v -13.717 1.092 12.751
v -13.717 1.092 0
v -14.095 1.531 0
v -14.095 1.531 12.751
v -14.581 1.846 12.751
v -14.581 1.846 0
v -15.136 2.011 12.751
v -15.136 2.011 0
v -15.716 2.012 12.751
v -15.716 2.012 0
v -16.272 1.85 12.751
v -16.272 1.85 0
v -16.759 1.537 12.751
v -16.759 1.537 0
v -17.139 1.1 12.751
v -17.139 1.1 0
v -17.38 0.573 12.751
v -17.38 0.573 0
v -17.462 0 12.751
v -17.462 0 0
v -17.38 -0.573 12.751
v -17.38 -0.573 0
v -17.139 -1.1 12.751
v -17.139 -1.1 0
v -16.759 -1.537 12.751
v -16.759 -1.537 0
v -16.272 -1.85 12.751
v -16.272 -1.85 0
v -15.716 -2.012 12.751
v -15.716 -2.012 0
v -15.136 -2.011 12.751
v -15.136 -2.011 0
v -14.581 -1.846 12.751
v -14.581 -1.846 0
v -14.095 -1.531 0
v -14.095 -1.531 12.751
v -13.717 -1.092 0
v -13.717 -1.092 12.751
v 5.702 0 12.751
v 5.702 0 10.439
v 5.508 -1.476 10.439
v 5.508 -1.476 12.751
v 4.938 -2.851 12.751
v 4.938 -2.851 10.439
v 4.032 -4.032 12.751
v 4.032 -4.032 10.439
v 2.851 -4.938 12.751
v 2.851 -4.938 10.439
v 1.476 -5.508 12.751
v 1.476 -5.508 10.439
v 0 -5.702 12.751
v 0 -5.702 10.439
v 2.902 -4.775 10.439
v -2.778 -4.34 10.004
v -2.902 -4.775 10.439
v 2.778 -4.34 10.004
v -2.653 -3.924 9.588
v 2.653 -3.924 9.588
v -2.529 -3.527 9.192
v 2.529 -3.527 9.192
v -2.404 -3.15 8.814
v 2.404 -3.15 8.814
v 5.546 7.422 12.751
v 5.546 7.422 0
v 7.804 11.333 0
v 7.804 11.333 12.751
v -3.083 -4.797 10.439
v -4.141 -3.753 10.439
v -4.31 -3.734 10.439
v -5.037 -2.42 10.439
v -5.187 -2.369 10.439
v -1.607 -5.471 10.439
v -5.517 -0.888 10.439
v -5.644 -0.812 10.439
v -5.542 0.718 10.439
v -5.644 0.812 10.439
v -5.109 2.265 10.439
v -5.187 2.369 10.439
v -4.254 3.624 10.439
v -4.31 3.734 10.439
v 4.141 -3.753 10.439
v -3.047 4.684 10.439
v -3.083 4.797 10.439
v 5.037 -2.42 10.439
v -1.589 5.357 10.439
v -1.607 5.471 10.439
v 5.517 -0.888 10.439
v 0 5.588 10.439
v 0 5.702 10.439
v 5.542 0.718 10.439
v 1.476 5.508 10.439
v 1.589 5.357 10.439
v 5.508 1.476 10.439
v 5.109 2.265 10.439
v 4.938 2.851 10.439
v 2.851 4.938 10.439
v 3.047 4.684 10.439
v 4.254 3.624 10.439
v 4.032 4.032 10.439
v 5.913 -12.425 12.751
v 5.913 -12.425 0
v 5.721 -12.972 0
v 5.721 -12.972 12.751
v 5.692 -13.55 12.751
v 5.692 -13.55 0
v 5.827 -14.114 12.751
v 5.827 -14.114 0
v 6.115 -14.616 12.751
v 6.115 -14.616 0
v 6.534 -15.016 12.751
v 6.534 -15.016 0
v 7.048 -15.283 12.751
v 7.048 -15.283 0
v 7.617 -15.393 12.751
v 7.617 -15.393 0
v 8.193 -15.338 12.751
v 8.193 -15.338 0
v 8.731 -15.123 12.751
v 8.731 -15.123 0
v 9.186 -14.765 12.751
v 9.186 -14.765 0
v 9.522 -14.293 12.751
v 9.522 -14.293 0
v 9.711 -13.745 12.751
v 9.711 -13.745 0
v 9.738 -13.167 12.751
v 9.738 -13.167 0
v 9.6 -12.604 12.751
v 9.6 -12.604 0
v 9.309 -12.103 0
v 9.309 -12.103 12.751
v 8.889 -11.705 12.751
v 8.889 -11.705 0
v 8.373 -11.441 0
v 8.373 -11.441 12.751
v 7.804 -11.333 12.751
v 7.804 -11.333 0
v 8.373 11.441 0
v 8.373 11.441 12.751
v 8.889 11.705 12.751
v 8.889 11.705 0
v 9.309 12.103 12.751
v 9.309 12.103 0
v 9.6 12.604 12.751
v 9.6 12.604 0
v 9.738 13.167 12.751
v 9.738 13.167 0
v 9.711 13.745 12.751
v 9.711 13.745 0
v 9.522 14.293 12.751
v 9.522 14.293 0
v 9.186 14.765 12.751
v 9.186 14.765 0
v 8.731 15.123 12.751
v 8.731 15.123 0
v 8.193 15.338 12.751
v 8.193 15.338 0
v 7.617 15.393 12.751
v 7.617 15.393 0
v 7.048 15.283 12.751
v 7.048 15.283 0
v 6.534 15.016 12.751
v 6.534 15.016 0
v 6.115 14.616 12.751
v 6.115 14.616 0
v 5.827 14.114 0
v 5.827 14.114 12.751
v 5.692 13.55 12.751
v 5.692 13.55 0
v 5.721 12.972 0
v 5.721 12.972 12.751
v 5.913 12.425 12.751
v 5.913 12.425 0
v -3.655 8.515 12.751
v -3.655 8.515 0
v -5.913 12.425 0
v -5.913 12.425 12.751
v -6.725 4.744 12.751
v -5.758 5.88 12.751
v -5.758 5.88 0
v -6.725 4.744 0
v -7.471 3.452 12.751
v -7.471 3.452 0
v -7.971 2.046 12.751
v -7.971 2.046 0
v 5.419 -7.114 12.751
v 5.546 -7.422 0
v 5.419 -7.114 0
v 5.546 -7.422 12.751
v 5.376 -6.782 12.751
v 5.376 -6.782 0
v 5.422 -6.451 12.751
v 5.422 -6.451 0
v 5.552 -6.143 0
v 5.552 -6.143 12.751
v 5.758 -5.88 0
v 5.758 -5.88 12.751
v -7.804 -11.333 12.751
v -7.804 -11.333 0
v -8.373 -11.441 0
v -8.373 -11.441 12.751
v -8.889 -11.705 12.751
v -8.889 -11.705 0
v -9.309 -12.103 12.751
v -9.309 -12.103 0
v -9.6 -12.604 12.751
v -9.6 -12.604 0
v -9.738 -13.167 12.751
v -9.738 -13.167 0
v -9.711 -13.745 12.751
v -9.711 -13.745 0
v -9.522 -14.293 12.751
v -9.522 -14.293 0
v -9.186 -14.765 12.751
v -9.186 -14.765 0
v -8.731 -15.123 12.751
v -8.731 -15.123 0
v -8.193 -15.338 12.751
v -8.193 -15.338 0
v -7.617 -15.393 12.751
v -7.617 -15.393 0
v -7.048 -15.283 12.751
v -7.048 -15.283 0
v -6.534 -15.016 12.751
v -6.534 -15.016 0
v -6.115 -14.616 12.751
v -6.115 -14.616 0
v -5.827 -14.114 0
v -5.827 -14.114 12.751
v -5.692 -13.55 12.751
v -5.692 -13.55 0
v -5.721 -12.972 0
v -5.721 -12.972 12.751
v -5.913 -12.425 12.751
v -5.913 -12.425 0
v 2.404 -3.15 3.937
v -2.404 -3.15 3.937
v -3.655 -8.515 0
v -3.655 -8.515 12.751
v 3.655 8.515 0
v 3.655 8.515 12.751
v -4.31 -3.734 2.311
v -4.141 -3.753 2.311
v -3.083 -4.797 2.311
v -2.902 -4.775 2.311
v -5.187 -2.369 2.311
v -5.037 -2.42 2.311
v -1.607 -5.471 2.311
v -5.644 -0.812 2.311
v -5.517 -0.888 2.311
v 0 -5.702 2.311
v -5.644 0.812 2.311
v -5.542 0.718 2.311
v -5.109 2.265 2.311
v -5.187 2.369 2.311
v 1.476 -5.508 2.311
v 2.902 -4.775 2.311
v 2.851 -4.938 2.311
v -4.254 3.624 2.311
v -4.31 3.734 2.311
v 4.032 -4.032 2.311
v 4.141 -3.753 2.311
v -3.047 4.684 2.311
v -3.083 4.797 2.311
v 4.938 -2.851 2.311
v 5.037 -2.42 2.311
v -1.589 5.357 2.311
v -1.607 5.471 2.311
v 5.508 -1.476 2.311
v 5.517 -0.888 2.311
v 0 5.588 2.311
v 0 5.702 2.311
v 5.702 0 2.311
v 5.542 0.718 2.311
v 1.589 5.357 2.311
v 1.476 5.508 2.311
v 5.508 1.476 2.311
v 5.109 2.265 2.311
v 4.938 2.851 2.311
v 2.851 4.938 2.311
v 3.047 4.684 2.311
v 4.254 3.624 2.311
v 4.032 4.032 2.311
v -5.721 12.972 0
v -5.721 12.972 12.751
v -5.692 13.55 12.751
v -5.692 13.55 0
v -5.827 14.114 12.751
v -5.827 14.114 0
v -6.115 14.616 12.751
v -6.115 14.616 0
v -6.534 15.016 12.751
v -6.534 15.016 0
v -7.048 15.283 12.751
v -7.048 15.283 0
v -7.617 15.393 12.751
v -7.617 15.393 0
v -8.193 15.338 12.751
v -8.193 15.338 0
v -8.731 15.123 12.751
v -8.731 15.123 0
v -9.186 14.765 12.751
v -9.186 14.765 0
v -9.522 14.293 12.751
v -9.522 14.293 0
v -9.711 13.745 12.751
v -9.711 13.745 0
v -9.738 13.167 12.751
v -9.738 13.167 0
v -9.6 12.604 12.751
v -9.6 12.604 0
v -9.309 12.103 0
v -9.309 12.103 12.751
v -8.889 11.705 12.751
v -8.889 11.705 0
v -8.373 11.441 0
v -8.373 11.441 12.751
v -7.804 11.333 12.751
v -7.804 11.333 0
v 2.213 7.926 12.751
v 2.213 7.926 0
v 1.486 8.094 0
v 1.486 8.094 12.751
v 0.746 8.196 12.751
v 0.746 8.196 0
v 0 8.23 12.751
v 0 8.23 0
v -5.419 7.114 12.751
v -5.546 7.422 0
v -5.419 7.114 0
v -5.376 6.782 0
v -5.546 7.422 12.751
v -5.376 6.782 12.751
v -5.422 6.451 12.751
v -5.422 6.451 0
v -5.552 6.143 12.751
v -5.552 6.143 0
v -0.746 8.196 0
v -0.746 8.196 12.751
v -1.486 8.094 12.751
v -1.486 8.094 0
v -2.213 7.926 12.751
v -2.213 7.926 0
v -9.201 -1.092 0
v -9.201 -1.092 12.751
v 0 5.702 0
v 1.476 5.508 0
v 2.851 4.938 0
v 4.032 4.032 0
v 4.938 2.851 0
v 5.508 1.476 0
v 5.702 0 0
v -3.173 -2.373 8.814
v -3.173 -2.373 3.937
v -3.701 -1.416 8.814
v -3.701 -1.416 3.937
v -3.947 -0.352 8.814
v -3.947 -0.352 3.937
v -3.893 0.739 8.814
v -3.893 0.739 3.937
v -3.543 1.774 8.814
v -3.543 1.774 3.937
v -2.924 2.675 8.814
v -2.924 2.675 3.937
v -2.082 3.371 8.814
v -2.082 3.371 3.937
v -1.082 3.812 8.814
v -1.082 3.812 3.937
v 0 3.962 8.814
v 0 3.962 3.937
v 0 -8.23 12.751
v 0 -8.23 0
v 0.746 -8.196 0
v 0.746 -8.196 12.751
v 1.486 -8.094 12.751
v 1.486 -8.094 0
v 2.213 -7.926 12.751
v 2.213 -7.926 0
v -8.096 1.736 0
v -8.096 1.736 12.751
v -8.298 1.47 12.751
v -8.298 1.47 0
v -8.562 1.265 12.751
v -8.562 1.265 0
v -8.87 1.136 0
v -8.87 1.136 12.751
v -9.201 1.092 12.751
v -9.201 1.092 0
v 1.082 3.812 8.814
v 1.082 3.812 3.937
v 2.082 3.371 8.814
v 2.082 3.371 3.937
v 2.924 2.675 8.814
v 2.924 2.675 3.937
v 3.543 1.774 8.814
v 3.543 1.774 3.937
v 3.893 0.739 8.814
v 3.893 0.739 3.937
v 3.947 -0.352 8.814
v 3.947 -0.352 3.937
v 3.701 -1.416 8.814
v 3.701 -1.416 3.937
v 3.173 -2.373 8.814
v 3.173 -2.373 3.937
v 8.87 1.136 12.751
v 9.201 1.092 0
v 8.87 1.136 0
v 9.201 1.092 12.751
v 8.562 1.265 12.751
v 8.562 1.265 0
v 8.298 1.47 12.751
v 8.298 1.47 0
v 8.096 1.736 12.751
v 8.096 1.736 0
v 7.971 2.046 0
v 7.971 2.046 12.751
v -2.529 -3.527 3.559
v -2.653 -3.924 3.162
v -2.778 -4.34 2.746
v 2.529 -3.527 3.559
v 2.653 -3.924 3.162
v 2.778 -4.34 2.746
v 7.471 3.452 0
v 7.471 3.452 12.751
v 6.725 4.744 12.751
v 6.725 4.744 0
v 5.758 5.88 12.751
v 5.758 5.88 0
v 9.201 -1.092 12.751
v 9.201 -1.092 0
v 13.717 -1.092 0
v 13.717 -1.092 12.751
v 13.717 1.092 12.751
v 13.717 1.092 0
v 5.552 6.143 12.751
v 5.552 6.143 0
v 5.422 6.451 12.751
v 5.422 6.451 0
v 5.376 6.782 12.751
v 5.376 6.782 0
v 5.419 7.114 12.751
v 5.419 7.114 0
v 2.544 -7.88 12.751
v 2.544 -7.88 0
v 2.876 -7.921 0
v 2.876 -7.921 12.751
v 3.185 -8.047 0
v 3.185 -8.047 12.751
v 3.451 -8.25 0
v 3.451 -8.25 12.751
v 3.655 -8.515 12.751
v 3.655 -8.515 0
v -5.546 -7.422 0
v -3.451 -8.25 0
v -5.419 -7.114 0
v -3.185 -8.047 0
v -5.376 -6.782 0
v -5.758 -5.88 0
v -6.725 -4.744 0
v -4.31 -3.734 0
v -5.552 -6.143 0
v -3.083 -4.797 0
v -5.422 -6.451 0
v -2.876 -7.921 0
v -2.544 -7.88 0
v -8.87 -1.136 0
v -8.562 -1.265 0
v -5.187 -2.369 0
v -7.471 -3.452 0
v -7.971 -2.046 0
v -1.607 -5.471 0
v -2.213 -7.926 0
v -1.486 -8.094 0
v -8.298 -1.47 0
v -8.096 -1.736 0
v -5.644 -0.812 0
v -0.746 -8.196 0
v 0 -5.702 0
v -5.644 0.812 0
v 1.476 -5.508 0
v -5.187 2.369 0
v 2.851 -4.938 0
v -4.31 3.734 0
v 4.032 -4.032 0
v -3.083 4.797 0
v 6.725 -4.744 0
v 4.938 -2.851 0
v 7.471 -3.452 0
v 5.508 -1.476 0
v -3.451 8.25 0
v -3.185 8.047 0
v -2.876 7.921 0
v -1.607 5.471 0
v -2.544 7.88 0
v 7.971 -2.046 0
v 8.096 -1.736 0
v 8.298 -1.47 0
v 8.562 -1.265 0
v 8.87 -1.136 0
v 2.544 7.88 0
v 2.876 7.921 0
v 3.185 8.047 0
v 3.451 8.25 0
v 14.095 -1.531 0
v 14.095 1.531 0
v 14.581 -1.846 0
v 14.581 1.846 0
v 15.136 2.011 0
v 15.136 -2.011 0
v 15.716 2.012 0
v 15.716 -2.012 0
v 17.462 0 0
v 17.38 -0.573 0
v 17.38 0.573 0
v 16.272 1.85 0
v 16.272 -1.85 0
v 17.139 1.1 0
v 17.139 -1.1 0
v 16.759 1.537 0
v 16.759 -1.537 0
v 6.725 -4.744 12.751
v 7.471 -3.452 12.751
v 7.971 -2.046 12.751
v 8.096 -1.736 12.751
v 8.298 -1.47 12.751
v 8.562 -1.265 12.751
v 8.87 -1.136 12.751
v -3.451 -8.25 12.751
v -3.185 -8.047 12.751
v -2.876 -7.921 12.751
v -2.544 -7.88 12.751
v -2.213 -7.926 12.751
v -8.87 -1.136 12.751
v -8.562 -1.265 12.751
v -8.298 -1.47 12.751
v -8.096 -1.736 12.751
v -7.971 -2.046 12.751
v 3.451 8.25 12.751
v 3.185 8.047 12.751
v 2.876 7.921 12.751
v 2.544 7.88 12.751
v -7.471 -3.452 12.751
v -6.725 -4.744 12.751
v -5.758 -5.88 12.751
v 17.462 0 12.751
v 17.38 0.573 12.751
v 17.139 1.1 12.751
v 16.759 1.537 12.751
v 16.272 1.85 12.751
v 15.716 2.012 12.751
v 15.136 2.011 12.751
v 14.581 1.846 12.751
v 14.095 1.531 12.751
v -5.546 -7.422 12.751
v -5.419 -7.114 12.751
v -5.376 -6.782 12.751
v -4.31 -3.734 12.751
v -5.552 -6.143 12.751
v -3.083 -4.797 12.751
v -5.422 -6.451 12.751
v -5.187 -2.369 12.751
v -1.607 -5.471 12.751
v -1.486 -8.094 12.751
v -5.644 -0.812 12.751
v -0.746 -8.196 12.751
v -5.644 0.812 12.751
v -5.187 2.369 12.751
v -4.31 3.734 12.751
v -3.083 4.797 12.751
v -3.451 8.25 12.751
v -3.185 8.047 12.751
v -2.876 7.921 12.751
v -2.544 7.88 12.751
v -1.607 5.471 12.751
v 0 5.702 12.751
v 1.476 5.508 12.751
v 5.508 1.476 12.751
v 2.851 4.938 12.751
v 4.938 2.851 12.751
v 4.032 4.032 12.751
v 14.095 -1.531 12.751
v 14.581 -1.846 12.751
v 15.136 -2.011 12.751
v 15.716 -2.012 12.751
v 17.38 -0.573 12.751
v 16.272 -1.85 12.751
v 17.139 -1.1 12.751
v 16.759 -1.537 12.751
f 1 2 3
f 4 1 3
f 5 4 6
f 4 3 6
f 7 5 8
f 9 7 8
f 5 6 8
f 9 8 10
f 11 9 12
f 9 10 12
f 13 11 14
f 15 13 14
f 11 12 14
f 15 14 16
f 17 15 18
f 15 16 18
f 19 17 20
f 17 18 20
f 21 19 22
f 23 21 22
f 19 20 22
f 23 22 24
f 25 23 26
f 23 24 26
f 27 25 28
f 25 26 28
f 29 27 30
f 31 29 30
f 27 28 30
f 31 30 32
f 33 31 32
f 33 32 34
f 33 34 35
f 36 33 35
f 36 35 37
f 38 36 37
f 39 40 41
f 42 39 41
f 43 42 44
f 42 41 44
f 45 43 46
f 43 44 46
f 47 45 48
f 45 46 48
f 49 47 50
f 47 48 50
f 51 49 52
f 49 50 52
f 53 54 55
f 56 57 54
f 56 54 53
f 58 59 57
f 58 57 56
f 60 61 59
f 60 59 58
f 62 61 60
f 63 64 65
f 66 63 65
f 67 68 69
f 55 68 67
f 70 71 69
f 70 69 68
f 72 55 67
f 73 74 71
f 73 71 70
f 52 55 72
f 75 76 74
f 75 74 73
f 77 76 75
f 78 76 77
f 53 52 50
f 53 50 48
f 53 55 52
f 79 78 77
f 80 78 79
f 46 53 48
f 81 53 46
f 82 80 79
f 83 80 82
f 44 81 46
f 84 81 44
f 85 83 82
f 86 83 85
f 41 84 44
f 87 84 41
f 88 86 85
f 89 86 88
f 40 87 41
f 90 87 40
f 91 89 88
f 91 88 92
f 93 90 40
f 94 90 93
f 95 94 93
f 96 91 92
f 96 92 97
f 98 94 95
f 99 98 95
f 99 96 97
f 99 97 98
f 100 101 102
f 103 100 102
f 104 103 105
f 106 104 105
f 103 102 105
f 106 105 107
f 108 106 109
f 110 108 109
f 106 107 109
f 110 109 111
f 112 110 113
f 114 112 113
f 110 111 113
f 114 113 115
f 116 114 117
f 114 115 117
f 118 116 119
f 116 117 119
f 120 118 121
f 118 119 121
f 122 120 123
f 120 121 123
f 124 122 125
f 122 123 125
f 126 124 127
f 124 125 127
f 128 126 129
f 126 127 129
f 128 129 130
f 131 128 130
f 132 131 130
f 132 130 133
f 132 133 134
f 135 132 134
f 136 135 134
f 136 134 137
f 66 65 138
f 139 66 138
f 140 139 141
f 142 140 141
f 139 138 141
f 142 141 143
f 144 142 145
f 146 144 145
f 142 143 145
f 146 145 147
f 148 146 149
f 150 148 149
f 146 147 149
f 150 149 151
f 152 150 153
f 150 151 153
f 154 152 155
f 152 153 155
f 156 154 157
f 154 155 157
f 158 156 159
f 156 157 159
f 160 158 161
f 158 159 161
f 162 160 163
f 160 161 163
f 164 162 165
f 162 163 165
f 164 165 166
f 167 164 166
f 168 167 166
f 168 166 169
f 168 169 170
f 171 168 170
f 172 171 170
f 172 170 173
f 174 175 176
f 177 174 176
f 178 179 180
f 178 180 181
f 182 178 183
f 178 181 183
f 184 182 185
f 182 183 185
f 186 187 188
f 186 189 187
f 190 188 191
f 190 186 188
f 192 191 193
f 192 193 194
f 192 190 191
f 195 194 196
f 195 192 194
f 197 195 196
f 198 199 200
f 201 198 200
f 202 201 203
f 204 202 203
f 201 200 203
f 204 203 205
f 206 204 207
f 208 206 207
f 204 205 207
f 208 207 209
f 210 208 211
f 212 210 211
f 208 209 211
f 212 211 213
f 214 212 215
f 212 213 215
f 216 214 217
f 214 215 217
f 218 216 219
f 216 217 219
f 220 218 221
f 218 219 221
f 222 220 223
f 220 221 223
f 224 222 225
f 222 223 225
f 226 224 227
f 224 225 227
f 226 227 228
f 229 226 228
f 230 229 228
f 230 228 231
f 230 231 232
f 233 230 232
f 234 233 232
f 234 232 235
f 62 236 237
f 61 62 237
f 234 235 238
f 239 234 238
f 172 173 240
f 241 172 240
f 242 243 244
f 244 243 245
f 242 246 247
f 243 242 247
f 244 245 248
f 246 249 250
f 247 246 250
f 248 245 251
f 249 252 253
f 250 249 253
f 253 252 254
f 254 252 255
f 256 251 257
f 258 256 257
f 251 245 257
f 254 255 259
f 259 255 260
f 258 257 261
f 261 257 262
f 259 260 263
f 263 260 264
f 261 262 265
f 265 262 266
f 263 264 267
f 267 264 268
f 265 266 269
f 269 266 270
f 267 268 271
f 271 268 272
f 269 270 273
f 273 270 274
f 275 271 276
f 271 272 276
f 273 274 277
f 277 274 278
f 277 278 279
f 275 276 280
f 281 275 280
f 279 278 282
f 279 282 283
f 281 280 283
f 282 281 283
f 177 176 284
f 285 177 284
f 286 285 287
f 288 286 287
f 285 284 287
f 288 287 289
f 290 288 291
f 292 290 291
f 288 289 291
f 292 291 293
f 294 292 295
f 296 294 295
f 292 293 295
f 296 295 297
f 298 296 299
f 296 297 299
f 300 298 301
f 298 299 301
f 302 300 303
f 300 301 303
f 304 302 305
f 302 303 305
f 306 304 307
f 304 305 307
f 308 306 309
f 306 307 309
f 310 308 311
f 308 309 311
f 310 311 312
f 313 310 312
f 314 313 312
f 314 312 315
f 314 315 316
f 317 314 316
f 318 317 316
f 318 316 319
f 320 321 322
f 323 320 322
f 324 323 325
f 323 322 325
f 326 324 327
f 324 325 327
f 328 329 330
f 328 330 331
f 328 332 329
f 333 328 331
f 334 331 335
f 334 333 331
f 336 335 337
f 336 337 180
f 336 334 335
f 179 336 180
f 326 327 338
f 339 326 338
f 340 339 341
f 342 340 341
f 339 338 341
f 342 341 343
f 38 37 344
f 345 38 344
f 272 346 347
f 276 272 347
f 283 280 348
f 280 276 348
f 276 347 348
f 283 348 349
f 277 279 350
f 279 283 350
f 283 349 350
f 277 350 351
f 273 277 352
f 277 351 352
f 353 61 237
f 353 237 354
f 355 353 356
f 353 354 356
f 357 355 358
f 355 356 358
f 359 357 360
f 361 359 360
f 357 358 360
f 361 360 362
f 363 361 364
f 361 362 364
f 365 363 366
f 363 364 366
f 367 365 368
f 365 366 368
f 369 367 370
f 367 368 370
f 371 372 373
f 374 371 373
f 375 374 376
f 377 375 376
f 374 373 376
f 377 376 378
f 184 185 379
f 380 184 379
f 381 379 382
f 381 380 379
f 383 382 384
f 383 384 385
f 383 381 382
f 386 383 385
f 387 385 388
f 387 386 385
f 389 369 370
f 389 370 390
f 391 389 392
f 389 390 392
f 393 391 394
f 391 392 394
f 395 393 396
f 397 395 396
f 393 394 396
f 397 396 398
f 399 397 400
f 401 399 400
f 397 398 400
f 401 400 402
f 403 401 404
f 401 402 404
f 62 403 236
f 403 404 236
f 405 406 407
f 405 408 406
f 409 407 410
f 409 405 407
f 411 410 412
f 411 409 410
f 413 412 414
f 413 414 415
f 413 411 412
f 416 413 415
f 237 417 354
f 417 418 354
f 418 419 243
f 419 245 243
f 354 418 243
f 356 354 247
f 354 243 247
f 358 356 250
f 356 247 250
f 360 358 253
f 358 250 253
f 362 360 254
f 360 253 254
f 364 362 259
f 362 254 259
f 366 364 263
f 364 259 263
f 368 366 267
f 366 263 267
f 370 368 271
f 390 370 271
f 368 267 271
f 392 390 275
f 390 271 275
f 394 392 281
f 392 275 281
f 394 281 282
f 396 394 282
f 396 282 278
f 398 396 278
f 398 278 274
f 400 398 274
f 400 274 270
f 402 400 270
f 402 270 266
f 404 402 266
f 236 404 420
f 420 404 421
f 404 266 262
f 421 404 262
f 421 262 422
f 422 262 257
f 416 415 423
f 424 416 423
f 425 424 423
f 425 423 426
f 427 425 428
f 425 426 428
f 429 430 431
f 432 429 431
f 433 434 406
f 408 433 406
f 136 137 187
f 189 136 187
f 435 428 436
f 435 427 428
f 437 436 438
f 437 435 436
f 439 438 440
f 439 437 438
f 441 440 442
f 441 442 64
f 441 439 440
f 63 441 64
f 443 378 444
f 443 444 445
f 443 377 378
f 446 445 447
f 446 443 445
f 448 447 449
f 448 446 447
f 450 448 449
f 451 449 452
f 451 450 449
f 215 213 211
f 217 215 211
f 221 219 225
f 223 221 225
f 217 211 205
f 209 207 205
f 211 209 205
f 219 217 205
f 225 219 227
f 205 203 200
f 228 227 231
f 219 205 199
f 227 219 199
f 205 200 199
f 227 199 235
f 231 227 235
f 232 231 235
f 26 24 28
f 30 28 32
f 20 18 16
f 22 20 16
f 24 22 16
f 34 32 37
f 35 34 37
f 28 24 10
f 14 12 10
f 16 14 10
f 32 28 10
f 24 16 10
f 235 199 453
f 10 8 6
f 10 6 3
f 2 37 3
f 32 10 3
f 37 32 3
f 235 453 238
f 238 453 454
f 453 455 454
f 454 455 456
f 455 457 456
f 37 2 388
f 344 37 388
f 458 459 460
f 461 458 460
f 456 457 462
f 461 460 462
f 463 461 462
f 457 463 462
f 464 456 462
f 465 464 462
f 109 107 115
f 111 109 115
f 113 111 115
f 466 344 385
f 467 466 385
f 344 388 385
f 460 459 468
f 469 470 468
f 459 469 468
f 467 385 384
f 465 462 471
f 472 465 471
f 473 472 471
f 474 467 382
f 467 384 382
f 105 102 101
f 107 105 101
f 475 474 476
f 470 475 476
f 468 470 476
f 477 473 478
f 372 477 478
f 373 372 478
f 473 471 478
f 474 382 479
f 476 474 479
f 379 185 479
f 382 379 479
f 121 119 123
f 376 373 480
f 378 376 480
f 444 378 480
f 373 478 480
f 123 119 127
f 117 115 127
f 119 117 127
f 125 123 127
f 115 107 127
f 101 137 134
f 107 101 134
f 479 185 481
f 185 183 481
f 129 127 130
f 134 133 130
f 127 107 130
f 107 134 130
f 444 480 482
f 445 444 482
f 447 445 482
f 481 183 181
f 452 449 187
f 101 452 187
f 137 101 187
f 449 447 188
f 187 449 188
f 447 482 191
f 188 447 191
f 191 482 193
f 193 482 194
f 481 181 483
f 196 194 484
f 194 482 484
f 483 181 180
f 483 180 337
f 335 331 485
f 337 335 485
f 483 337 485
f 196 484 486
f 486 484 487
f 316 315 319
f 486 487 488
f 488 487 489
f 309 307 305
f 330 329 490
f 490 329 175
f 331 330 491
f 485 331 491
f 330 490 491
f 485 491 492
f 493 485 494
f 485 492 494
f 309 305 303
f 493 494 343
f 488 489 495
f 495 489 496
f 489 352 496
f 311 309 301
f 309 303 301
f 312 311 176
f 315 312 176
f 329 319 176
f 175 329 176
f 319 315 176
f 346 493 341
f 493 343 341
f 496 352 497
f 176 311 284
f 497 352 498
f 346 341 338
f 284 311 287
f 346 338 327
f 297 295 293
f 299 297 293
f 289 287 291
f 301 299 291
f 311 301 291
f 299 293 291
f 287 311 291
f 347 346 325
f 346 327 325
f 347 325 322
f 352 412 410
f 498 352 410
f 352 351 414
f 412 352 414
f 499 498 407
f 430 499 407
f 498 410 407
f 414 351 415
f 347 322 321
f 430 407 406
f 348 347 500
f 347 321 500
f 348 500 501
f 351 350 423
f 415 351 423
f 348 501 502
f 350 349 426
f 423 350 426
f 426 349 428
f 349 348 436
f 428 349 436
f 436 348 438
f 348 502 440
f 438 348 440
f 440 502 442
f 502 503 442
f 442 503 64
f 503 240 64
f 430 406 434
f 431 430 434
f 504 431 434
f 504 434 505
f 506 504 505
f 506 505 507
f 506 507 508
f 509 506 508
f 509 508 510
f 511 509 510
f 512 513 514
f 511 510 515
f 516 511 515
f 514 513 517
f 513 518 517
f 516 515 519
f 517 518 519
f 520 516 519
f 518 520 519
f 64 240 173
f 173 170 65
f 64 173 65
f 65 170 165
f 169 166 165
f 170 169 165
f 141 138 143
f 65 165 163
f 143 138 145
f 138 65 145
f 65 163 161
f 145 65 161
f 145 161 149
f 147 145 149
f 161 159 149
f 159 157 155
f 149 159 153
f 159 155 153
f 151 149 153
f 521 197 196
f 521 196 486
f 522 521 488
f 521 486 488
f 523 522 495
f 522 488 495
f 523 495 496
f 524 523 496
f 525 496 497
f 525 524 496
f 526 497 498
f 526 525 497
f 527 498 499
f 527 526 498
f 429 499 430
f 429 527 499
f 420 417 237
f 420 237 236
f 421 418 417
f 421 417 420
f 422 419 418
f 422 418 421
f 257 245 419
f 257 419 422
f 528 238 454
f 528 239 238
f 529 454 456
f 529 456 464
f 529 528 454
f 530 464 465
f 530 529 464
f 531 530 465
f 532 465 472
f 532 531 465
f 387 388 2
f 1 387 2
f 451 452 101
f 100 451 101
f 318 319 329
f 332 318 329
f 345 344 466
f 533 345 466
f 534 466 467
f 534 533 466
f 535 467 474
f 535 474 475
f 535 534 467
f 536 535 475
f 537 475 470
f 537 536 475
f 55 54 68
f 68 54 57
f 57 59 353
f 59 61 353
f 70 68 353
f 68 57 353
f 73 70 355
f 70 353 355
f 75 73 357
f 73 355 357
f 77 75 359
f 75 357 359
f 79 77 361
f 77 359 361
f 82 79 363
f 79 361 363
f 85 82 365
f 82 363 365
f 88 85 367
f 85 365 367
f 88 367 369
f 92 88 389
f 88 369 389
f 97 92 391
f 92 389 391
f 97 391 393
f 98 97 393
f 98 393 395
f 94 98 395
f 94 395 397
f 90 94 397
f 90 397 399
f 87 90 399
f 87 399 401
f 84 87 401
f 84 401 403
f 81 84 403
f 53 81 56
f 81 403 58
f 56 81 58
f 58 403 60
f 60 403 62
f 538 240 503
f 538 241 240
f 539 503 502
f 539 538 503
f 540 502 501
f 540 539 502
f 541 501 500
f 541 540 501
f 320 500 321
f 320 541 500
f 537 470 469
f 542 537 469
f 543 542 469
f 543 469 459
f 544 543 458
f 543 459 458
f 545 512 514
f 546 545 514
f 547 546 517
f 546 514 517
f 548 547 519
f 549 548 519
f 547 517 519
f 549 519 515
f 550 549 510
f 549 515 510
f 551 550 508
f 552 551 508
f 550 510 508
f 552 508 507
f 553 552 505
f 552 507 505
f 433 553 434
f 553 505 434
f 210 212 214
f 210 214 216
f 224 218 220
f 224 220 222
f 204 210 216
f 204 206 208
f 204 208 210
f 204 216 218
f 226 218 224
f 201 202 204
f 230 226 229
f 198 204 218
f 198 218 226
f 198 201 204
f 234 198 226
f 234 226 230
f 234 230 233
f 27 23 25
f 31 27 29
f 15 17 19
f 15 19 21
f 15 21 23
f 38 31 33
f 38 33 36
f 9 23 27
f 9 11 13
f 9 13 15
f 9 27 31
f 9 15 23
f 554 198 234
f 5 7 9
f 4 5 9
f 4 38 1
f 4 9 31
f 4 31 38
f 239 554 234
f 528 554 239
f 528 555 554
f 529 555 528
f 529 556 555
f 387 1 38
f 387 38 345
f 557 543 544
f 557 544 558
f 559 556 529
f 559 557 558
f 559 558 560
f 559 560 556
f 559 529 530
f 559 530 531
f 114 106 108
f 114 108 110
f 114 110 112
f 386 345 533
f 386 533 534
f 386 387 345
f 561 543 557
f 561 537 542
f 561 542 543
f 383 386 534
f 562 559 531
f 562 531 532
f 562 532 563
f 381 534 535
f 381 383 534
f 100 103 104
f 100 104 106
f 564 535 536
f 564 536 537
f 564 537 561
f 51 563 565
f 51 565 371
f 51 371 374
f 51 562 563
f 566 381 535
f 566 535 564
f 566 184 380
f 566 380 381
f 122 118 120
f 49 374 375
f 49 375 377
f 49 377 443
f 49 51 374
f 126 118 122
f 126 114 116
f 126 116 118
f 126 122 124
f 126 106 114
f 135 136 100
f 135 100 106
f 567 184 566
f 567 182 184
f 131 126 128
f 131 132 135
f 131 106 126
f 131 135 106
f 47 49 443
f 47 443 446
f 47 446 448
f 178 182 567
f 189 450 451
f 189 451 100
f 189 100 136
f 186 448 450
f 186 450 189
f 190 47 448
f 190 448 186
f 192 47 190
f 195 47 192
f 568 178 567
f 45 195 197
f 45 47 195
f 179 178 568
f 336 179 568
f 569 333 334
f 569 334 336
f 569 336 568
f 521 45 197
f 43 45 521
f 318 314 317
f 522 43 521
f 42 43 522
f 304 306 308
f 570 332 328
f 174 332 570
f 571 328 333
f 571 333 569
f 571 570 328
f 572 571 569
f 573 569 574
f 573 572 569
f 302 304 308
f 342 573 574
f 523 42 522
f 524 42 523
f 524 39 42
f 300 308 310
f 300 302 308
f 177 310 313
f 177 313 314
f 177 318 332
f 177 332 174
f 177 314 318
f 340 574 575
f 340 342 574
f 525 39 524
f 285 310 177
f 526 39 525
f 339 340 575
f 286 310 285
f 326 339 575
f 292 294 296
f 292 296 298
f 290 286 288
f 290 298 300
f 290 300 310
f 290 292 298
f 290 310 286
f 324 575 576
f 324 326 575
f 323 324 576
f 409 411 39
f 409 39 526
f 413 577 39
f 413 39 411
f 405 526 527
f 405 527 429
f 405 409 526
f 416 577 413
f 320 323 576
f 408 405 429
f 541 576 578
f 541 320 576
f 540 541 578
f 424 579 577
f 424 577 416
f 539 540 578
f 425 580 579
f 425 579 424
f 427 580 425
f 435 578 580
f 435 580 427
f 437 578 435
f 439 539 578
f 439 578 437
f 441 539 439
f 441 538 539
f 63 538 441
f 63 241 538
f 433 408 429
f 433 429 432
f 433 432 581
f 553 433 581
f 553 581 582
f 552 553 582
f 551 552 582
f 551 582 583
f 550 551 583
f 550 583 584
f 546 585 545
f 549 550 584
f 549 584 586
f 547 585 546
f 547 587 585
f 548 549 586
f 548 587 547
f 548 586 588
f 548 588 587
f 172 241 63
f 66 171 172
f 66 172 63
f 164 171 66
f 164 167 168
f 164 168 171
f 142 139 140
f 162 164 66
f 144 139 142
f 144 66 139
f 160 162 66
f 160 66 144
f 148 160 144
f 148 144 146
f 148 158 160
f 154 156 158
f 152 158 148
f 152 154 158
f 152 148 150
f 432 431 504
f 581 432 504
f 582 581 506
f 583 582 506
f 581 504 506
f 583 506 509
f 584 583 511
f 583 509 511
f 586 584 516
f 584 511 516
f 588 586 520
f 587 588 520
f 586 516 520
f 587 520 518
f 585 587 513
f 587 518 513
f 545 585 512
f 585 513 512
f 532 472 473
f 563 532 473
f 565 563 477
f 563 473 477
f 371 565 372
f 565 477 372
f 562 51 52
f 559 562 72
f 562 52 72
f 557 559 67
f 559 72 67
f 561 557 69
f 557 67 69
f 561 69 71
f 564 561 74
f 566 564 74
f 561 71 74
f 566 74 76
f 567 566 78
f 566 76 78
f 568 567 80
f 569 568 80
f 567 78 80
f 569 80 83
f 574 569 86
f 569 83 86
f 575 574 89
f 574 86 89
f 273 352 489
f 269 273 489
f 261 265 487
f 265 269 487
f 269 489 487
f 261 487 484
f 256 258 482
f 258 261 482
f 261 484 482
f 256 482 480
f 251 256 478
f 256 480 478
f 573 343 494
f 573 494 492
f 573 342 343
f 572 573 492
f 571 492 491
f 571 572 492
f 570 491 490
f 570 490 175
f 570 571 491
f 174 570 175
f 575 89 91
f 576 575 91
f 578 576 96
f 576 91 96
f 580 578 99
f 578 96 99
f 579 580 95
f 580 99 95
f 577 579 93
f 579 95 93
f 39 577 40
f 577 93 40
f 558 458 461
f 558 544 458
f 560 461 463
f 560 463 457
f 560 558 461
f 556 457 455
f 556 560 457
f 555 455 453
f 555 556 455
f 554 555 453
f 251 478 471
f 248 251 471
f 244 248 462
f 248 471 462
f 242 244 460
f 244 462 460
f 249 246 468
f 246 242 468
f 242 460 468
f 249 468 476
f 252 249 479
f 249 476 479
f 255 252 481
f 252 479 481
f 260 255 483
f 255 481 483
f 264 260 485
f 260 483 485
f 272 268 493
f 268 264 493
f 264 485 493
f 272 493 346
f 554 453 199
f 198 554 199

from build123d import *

# Parameters (mm, degrees)
F1_DEPTH     = 12.7508
F2_START     = 2.3114
F2_DEPTH     = 8.128
F3_R         = 1.27
F4_T4_DEPTH  = 13.1696453782
F4_S5_R      = 3.9624
F4_T6_DEPTH  = 8
F4_T15_DEPTH = 13.1696453782
F4_S16_R     = 3.9624
F4_T17_DEPTH = 8


# Not quite as in the source:
# - a fillet or chamfer that OpenCascade refuses, or shapes differently, is made with other operations: its cross-section is extruded or revolved along the edge and cut away or added
# - a feature names something its author has since deleted; it is built from what else it names


with BuildPart() as f1:
    # F0 (on Top) → F1 (new body)
    with BuildSketch(Plane.XY):
        with BuildLine():
            ThreePointArc((0, -5.7023), (-5.7023, 0), (0, 5.7023))
            Line((0, 5.7023), (0, 8.2296))
            ThreePointArc((0, 8.2296), (-1.596599089, 8.0732389726), (-3.1325279453, 7.6100975573))
            Line((-3.1325279453, 7.6100975573), (-5.9126210852, 12.4253601255))
            ThreePointArc((-5.9126210852, 12.4253601255), (-8.73125, 15.1229686136), (-7.8043669773, 11.3331601255))
            Line((-7.8043669773, 11.3331601255), (-5.0242738373, 6.5178975573))
            ThreePointArc((-5.0242738373, 6.5178975573), (-7.127042663, 4.1148), (-8.1568017826, 1.0922))
            Line((-8.1568017826, 1.0922), (-13.7169880625, 1.0922))
            ThreePointArc((-13.7169880625, 1.0922), (-17.4625, 0), (-13.7169880625, -1.0922))
            Line((-13.7169880625, -1.0922), (-8.1568017826, -1.0922))
            ThreePointArc((-8.1568017826, -1.0922), (-7.127042663, -4.1148), (-5.0242738373, -6.5178975573))
            Line((-5.0242738373, -6.5178975573), (-7.8043669773, -11.3331601255))
            ThreePointArc((-7.8043669773, -11.3331601255), (-8.73125, -15.1229686136), (-5.9126210852, -12.4253601255))
            Line((-5.9126210852, -12.4253601255), (-3.1325279453, -7.6100975573))
            ThreePointArc((-3.1325279453, -7.6100975573), (-1.596599089, -8.0732389726), (0, -8.2296))
            Line((0, -8.2296), (0, -5.7023))
        make_face()
        with BuildLine():
            ThreePointArc((0, 5.7023), (4.0321349984, 4.0321349984), (5.7023, 0))
            ThreePointArc((5.7023, 0), (4.0321349984, -4.0321349984), (0, -5.7023))
            Line((0, -5.7023), (0, -8.2296))
            ThreePointArc((0, -8.2296), (1.596599089, -8.0732389726), (3.1325279453, -7.6100975573))
            Line((3.1325279453, -7.6100975573), (5.9126210852, -12.4253601255))
            ThreePointArc((5.9126210852, -12.4253601255), (8.73125, -15.1229686136), (7.8043669773, -11.3331601255))
            Line((7.8043669773, -11.3331601255), (5.0242738373, -6.5178975573))
            ThreePointArc((5.0242738373, -6.5178975573), (7.127042663, -4.1148), (8.1568017826, -1.0922))
            Line((8.1568017826, -1.0922), (13.7169880625, -1.0922))
            ThreePointArc((13.7169880625, -1.0922), (15.9993443297, -1.9507537334), (17.4625, 0))
            ThreePointArc((17.4625, 0), (15.9993443297, 1.9507537334), (13.7169880625, 1.0922))
            Line((13.7169880625, 1.0922), (8.1568017826, 1.0922))
            ThreePointArc((8.1568017826, 1.0922), (7.127042663, 4.1148), (5.0242738373, 6.5178975573))
            Line((5.0242738373, 6.5178975573), (7.8043669773, 11.3331601255))
            ThreePointArc((7.8043669773, 11.3331601255), (8.73125, 15.1229686136), (5.9126210852, 12.4253601255))
            Line((5.9126210852, 12.4253601255), (3.1325279453, 7.6100975573))
            ThreePointArc((3.1325279453, 7.6100975573), (1.596599089, 8.0732389726), (0, 8.2296))
            Line((0, 8.2296), (0, 5.7023))
        make_face()
    extrude(amount=F1_DEPTH)

    # F0 (on Top) → F2 (join)
    with BuildSketch(Plane.XY.offset(F2_START)):
        with BuildLine():
            Line((0, 3.9624), (0, 5.7023))
            ThreePointArc((0, 5.7023), (-5.7023, 0), (0, -5.7023))
            Line((0, -5.7023), (0, -3.1496))
            Line((0, -3.1496), (-2.4042948239, -3.1496))
            ThreePointArc((-2.4042948239, -3.1496), (-3.7537040906, 1.2689835933), (0, 3.9624))
        make_face()
        with BuildLine():
            ThreePointArc((0, -5.7023), (4.0321349984, -4.0321349984), (5.7023, 0))
            ThreePointArc((5.7023, 0), (4.0321349984, 4.0321349984), (0, 5.7023))
            Line((0, 5.7023), (0, 3.9624))
            ThreePointArc((0, 3.9624), (3.7537040906, 1.2689835933), (2.4042948239, -3.1496))
            Line((2.4042948239, -3.1496), (0, -3.1496))
            Line((0, -3.1496), (0, -5.7023))
        make_face()
    extrude(amount=F2_DEPTH)

    # F3
    f3_edges = [f1.edges().sort_by_distance(p)[0] for p in [
        (-8.156802, 1.0922, 6.3754),
        (-8.156802, -1.0922, 6.3754),
        (3.132528, 7.610098, 6.3754),
        (-3.132528, 7.610098, 6.3754),
        (5.024274, 6.517898, 6.3754),
        (8.156802, 1.0922, 6.3754),
        (8.156802, -1.0922, 6.3754),
        (5.024274, -6.517898, 6.3754),
        (3.132528, -7.610098, 6.3754),
        (-3.132528, -7.610098, 6.3754),
        (-5.024274, -6.517898, 6.3754),
        (-5.024274, 6.517898, 6.3754),
    ]]
    fillet(f3_edges, radius=F3_R)

    # F4: chamfer of 1.6256 on 4 edges, made by hand


with BuildPart() as f4_tool2:
    # F4_s3 → F4_t4 (new body)
    with BuildSketch(Plane.YZ.offset(6.5848226891)):
        Polygon((-3.1496, 3.937), (-4.7752, 2.3114), (-3.1496, 2.3114), align=None)
    extrude(amount=-F4_T4_DEPTH)

    # F4_s5 → F4_t6 (intersect, symmetric)
    with BuildSketch(Plane.XY.offset(3.1)):
        Circle(F4_S5_R)
    extrude(amount=F4_T6_DEPTH, both=True, mode=Mode.INTERSECT)


with BuildPart() as f1_1:
    add(f1.part)

    # F4_t1: cut F4_tool2
    add(f4_tool2.part, mode=Mode.SUBTRACT)


with BuildPart() as f4_tool8:
    # F4_s9 → F4_t10 (revolve)
    with BuildSketch(Plane(origin=(0, 0, 0), x_dir=(0, 0, 1), z_dir=(0.7948717949, -0.6067774137, 0))):
        Polygon((3.937, 3.9624), (2.3114, 5.588), (2.3114, 3.9624), align=None)
    revolve(axis=Axis((0, 0, 2.3114), (0, 0, -1)))

    split(bisect_by=Plane(origin=(0, -3.5433, 3.5433), x_dir=(1, 0, 0), z_dir=(0, 0.7071067812, -0.7071067812)), keep=Keep.TOP)


with BuildPart() as f1_2:
    add(f1_1.part)

    # F4_t7: cut F4_tool8
    add(f4_tool8.part, mode=Mode.SUBTRACT)


with BuildPart() as f4_tool13:
    # F4_s14 → F4_t15 (new body)
    with BuildSketch(Plane.YZ.offset(6.5848226891)):
        Polygon((-4.7752, 10.4394), (-3.1496, 8.8138), (-3.1496, 10.4394), align=None)
    extrude(amount=-F4_T15_DEPTH)

    # F4_s16 → F4_t17 (intersect, symmetric)
    with BuildSketch(Plane.XY.offset(9.6)):
        Circle(F4_S16_R)
    extrude(amount=F4_T17_DEPTH, both=True, mode=Mode.INTERSECT)


with BuildPart() as f1_3:
    add(f1_2.part)

    # F4_t12: cut F4_tool13
    add(f4_tool13.part, mode=Mode.SUBTRACT)


with BuildPart() as f4_tool19:
    # F4_s20 → F4_t21 (revolve)
    with BuildSketch(Plane(origin=(0, 0, 0), x_dir=(0, 0, 1), z_dir=(0.7948717949, -0.6067774137, 0))):
        Polygon((10.4394, 5.588), (8.8138, 3.9624), (10.4394, 3.9624), align=None)
    revolve(axis=Axis((0, 0, 10.4394), (0, 0, -1)))

    split(bisect_by=Plane(origin=(0, 2.8321, 2.8321), x_dir=(1, 0, 0), z_dir=(0, 0.7071067812, 0.7071067812)), keep=Keep.TOP)


with BuildPart() as f1_4:
    add(f1_3.part)

    # F4_t18: cut F4_tool19
    add(f4_tool19.part, mode=Mode.SUBTRACT)


solid = f1_4.part
